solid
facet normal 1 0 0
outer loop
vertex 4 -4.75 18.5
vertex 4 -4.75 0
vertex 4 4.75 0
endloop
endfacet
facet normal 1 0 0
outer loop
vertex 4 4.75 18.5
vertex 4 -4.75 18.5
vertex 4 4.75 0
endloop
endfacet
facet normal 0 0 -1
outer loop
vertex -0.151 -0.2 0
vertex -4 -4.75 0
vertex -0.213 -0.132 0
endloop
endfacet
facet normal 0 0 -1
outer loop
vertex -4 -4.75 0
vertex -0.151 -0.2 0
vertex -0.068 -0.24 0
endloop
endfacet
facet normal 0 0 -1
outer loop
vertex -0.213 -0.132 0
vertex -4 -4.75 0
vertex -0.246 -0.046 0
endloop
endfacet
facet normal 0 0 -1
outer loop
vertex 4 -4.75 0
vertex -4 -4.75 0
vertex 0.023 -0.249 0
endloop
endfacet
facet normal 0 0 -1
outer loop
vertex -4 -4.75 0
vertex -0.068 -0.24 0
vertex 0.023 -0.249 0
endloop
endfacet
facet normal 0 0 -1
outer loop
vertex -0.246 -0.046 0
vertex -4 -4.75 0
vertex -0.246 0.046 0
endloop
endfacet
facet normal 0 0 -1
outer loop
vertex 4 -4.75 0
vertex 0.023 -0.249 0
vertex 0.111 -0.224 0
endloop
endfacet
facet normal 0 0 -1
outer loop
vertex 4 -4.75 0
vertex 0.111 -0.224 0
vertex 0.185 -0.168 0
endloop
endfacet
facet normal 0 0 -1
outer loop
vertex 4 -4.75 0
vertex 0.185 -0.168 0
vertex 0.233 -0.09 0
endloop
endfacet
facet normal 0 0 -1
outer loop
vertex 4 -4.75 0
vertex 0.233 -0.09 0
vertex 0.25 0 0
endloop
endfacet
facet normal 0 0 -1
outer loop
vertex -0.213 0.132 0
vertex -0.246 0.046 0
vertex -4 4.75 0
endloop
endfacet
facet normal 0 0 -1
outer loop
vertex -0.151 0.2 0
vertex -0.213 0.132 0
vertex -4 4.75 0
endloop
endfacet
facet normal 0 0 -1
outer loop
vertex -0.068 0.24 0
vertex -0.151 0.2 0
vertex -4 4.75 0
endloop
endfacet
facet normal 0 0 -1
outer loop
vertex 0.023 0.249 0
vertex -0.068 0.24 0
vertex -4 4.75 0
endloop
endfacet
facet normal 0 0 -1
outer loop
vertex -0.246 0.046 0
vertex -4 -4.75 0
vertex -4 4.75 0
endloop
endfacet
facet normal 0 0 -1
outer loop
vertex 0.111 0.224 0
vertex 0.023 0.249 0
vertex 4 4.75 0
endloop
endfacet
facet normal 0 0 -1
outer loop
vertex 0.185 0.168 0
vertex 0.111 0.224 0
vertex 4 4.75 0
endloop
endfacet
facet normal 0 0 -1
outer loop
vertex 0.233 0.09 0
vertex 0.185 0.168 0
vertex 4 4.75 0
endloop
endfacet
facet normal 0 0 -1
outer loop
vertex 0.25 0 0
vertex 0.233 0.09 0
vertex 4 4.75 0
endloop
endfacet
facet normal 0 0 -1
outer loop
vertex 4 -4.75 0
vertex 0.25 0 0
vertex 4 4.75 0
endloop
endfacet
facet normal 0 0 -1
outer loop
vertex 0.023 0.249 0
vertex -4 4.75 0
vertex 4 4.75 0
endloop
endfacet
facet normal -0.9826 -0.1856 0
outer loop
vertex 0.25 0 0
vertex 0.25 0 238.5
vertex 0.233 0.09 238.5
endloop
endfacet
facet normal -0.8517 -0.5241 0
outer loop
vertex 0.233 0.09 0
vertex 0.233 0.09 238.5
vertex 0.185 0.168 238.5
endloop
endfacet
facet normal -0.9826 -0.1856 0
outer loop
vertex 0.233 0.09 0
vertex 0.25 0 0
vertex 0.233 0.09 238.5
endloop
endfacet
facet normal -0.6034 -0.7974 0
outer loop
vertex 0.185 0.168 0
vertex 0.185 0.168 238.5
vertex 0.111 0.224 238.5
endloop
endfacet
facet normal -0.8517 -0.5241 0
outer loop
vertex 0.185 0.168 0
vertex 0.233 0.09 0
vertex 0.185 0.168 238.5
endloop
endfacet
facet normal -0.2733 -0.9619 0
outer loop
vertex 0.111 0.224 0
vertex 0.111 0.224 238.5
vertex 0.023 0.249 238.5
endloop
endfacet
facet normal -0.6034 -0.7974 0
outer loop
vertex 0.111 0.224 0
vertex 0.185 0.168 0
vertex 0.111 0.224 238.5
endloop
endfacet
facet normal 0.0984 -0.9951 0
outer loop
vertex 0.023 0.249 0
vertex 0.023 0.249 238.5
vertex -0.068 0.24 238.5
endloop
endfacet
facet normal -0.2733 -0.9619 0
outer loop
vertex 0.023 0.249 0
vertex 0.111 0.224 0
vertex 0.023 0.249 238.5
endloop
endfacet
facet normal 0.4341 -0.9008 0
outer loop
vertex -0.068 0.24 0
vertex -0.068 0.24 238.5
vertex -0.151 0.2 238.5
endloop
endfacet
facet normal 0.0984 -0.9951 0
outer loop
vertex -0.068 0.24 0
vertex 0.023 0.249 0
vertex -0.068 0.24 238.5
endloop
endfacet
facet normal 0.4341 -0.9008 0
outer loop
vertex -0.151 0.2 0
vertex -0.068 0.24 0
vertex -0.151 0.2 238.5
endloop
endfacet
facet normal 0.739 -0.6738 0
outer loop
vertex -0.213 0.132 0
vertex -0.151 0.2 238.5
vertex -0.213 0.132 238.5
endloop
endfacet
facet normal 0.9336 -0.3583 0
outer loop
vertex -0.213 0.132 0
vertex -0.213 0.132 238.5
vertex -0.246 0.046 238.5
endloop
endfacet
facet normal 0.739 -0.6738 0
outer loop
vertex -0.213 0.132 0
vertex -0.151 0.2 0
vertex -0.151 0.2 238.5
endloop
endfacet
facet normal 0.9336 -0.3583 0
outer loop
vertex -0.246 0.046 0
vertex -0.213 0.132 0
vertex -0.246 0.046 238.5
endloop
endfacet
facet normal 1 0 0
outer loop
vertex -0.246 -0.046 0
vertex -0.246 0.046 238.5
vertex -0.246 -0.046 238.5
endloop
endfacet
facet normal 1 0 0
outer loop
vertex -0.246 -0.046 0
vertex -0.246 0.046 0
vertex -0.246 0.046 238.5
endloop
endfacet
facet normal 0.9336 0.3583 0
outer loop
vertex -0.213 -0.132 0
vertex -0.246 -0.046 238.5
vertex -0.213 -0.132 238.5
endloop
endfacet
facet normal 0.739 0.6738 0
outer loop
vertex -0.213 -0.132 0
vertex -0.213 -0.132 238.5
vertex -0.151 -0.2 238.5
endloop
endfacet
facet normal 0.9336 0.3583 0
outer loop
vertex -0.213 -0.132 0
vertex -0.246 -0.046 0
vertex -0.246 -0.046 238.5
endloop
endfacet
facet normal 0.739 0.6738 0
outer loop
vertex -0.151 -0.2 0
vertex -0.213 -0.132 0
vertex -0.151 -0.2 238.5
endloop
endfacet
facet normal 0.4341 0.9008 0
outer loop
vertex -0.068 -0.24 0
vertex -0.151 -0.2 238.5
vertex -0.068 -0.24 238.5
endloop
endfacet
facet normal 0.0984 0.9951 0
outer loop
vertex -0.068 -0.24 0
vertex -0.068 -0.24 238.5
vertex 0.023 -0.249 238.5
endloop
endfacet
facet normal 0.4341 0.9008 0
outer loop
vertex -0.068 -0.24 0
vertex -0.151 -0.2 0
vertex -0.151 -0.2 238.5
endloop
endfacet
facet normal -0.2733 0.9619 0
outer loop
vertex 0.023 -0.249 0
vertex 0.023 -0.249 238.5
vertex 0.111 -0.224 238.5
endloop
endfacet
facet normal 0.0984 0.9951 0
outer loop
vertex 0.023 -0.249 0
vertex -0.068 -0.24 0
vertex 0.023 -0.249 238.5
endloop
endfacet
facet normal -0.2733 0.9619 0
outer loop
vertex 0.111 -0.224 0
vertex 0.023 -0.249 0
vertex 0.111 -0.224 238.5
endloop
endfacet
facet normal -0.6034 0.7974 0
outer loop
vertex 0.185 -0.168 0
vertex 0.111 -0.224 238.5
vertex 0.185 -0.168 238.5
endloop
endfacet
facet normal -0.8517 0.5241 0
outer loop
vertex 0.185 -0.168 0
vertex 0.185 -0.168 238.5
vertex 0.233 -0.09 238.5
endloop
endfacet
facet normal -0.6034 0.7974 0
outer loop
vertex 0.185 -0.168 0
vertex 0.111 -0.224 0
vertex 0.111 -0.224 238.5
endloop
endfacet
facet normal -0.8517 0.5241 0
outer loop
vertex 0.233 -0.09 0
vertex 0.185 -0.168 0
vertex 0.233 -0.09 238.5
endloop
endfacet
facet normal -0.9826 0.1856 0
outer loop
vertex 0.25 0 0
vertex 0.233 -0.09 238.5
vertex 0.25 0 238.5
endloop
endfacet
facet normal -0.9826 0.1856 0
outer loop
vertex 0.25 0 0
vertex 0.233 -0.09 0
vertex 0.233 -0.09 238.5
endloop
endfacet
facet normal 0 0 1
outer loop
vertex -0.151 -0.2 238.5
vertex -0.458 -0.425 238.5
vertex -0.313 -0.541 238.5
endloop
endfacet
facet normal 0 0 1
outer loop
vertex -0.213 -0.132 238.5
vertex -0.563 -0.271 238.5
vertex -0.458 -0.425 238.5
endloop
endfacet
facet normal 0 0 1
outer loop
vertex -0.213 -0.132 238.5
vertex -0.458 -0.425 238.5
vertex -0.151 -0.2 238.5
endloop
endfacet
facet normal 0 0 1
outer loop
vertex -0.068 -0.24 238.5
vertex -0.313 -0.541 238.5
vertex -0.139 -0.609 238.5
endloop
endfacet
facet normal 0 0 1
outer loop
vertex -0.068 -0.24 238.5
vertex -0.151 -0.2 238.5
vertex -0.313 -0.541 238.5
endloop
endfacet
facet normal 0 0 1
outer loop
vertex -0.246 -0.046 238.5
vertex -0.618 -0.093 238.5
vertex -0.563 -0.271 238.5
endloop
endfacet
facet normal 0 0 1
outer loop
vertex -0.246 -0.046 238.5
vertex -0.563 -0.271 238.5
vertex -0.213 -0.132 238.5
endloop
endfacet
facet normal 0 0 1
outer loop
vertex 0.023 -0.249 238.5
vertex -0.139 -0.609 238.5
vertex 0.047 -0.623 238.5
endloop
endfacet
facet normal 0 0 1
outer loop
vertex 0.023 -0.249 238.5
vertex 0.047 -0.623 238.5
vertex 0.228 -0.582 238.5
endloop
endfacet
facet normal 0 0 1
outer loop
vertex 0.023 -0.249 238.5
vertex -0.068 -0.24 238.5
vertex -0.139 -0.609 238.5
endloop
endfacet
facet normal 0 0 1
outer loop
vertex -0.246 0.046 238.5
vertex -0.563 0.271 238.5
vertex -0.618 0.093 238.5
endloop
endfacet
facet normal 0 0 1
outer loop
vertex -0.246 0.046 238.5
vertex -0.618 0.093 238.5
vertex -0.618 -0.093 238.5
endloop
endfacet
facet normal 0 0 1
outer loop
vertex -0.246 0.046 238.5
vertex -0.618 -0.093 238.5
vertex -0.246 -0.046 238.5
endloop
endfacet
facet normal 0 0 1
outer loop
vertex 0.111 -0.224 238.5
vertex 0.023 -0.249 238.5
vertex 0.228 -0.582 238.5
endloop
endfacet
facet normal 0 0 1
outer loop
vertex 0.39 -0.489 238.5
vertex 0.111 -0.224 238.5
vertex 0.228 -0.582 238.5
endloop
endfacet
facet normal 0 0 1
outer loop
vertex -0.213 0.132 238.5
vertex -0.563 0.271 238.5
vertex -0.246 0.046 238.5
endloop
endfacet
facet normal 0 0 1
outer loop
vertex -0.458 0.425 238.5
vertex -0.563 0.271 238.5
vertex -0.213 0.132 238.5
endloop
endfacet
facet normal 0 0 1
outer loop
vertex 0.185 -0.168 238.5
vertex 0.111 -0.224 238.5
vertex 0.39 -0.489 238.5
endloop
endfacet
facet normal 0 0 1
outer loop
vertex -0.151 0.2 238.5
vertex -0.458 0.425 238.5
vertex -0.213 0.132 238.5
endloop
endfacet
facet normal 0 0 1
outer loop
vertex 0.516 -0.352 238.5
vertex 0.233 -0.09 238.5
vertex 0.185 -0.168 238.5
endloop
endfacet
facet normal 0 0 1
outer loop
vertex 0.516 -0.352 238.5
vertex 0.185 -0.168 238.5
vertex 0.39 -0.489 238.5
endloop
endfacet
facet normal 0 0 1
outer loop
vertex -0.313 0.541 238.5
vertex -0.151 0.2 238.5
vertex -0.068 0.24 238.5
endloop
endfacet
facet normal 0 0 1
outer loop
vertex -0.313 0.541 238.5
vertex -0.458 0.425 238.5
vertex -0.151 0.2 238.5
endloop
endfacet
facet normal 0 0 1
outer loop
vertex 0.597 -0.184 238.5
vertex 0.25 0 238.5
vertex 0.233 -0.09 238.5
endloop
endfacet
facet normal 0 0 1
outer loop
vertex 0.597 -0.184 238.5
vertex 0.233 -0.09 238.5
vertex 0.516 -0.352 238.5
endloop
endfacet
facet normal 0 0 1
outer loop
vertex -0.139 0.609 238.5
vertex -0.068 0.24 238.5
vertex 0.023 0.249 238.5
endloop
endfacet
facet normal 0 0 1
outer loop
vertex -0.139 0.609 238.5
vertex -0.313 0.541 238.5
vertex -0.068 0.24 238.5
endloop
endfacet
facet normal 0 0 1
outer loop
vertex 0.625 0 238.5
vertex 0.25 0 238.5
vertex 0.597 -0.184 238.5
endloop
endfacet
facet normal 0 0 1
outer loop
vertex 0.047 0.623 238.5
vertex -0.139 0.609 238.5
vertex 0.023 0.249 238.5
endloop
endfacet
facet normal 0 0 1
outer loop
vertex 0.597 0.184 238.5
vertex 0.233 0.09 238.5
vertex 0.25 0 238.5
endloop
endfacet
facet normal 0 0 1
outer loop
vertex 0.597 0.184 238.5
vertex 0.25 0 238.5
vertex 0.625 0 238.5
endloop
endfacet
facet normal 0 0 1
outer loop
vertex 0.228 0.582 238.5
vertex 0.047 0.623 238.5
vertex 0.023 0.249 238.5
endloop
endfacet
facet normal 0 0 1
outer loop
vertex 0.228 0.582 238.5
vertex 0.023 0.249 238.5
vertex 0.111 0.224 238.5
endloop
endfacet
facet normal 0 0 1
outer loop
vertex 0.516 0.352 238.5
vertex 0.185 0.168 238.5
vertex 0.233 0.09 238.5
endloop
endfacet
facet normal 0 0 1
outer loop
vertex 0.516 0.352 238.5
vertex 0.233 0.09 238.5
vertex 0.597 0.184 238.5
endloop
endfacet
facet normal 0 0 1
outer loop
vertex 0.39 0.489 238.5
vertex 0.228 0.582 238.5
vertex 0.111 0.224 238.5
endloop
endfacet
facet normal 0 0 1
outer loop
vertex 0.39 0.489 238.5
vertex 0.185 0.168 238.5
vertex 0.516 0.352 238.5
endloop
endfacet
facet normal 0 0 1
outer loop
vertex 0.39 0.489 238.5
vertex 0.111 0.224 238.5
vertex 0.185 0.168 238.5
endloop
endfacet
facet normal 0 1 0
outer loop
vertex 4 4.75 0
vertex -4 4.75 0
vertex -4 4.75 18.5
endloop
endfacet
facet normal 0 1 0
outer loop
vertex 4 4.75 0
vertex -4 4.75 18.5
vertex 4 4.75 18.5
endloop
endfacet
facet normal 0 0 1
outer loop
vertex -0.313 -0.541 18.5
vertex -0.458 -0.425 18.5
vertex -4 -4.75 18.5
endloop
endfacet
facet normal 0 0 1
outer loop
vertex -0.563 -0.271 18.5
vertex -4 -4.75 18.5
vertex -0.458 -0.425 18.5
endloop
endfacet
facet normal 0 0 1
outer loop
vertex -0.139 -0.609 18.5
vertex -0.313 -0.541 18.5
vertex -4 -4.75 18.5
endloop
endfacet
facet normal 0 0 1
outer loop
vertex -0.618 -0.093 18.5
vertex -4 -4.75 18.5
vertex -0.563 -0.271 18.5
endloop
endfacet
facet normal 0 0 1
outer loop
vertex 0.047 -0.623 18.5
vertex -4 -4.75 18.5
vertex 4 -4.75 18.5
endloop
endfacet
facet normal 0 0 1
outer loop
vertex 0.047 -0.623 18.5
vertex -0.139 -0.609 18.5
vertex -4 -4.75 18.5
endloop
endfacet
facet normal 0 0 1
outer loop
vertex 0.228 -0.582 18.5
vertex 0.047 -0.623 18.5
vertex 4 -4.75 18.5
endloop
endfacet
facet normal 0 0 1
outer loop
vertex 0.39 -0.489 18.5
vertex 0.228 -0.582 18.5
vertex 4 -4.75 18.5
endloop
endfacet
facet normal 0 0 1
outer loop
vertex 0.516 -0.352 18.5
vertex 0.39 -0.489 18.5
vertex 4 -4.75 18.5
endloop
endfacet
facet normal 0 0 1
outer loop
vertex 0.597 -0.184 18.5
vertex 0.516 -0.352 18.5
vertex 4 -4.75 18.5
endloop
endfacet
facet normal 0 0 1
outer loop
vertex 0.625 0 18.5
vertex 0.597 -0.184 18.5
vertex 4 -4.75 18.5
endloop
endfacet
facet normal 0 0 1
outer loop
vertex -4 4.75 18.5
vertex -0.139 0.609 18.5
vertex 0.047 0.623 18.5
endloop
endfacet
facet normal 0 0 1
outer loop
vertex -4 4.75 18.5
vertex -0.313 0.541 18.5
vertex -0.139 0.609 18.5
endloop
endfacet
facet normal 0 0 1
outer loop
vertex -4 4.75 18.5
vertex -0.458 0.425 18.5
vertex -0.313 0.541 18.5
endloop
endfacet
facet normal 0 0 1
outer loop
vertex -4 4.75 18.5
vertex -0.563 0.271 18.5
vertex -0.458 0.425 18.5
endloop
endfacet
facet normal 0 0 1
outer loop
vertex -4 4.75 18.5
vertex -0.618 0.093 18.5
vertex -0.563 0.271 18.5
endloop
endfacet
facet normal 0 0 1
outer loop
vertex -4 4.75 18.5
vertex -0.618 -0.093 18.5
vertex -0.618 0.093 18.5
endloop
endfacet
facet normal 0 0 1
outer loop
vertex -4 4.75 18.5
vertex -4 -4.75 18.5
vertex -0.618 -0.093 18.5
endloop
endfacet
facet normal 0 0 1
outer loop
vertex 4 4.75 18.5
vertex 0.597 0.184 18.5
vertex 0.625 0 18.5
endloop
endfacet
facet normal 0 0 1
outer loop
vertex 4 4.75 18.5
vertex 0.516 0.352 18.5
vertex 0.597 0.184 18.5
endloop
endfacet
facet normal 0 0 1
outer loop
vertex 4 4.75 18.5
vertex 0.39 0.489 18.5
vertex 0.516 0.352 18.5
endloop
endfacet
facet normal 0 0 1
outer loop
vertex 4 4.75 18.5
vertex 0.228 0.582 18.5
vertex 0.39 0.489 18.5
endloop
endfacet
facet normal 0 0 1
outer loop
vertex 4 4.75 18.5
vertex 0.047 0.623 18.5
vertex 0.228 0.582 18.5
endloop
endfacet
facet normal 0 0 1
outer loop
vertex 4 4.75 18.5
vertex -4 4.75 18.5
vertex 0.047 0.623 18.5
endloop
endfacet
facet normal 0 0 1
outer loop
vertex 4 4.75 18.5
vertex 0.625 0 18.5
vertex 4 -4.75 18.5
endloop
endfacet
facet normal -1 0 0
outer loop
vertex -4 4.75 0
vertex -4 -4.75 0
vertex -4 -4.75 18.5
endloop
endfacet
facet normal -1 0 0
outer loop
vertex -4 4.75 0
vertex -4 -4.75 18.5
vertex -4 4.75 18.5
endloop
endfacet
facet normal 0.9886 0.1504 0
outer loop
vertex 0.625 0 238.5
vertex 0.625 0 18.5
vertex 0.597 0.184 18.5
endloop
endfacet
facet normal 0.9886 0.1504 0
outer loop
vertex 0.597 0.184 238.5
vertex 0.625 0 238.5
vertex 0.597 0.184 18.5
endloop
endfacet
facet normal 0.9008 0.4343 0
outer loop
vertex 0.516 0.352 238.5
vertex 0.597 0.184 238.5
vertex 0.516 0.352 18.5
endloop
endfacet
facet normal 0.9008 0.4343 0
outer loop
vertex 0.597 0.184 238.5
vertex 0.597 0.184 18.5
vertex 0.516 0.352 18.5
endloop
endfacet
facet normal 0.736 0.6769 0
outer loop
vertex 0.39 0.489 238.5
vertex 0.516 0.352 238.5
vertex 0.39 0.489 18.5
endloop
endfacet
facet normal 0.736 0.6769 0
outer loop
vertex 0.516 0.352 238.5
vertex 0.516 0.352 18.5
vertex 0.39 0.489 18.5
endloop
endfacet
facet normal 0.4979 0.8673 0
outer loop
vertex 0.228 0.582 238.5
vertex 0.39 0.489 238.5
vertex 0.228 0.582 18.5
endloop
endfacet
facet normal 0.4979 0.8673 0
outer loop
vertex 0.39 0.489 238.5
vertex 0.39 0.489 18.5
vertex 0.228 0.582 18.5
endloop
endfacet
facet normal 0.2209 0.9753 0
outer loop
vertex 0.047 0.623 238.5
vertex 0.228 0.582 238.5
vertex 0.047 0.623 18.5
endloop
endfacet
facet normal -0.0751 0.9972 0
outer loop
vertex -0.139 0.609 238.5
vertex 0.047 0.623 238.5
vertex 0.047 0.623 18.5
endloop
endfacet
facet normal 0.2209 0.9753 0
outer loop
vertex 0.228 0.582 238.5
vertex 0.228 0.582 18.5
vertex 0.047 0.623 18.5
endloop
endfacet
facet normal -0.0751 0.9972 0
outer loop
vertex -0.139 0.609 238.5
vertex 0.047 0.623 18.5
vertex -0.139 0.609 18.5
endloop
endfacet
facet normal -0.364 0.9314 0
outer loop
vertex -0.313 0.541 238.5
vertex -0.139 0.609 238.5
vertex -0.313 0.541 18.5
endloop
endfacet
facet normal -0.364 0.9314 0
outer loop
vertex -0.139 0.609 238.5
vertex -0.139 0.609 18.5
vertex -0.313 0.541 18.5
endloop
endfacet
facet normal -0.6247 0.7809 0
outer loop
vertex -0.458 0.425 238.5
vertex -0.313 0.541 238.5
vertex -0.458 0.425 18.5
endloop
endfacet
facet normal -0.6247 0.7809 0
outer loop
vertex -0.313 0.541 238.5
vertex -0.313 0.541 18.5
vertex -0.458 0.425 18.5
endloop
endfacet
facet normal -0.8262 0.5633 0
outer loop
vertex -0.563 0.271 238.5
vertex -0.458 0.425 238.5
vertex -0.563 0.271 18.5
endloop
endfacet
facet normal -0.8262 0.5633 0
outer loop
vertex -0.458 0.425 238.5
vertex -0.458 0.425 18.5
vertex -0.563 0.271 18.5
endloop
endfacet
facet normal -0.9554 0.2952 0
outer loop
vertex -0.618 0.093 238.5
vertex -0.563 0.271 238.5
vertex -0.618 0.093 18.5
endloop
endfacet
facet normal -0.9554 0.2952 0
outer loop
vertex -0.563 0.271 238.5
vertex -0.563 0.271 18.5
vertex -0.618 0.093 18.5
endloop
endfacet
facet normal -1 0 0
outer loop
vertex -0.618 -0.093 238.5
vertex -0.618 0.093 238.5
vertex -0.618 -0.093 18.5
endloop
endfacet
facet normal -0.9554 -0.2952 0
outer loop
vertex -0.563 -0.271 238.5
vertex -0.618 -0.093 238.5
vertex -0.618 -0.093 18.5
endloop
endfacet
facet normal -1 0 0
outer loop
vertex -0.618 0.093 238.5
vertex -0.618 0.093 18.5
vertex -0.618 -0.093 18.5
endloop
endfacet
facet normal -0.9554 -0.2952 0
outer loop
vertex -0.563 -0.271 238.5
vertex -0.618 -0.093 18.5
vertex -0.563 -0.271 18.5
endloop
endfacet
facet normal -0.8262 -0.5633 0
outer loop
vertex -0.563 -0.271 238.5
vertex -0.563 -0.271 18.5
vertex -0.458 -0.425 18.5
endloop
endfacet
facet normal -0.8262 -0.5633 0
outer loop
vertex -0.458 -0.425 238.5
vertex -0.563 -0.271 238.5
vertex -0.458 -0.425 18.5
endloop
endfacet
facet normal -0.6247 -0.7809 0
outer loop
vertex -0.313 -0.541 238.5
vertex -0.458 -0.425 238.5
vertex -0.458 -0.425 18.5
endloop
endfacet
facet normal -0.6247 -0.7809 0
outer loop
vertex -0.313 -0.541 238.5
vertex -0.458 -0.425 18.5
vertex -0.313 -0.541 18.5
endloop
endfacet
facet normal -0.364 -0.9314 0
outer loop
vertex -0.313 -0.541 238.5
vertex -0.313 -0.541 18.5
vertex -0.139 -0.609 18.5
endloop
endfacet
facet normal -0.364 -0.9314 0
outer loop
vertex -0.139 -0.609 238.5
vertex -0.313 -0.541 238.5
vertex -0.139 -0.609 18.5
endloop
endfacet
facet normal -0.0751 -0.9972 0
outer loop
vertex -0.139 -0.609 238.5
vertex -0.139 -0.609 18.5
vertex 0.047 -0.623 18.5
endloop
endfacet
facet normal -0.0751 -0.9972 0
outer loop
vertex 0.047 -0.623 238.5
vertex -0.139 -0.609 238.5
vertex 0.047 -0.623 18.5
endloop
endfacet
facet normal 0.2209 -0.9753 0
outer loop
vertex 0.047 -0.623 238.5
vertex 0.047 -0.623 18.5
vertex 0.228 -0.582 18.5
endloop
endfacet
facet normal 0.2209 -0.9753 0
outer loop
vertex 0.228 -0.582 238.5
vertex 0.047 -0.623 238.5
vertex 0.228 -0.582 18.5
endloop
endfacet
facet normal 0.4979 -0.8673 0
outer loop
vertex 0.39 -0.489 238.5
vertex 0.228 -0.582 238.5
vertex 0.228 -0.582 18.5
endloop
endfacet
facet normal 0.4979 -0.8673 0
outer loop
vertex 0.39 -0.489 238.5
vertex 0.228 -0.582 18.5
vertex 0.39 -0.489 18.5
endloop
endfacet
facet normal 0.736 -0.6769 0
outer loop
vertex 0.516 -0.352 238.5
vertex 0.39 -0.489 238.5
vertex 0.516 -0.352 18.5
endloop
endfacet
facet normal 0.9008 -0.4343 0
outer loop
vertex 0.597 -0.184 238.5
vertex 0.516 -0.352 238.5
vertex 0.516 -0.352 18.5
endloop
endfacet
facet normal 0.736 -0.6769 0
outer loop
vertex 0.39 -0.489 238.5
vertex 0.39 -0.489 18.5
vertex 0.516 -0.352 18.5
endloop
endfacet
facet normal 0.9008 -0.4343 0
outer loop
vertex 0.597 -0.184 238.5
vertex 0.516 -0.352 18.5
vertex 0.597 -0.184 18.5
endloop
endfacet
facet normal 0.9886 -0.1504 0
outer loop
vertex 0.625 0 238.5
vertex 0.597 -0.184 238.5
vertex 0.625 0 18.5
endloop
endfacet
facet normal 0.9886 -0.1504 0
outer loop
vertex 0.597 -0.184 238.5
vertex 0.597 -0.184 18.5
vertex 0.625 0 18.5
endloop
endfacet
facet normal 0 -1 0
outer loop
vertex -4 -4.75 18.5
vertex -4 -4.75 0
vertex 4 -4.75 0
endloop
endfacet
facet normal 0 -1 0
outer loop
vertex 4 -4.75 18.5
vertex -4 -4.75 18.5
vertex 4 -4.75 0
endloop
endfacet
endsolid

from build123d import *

# Parameters (mm, degrees)
ESBO_O1_W                = 8
ESBO_O1_H                = 9.5
RESSALTO_EXTRUS_O1_DEPTH = 18.5
ESBO_O2_R                = 0.625
ESBO_O2_R_2              = 0.25
RESSALTO_EXTRUS_O2_DEPTH = 220
CORTE_EXTRUS_O1_START    = -230
ESBO_O2_3_R              = 0.25
CORTE_EXTRUS_O1_DEPTH    = 230


with BuildPart() as part:
    # Esboço1 → Ressalto-extrusão1 (new body)
    with BuildSketch(Plane.XY):
        Rectangle(ESBO_O1_W, ESBO_O1_H)
    extrude(amount=RESSALTO_EXTRUS_O1_DEPTH)

    # Esboço2 → Ressalto-extrusão2 (add)
    with BuildSketch(Plane.XY.offset(18.5)):
        Circle(ESBO_O2_R)
        Circle(ESBO_O2_R_2, mode=Mode.SUBTRACT)
    extrude(amount=RESSALTO_EXTRUS_O2_DEPTH)

    # Esboço2<3> → Corte-extrusão1 (cut)
    with BuildSketch(Plane.XY.offset(18.5).offset(CORTE_EXTRUS_O1_START)):
        Circle(ESBO_O2_3_R)
    extrude(amount=CORTE_EXTRUS_O1_DEPTH, mode=Mode.SUBTRACT)


solid = part.part
